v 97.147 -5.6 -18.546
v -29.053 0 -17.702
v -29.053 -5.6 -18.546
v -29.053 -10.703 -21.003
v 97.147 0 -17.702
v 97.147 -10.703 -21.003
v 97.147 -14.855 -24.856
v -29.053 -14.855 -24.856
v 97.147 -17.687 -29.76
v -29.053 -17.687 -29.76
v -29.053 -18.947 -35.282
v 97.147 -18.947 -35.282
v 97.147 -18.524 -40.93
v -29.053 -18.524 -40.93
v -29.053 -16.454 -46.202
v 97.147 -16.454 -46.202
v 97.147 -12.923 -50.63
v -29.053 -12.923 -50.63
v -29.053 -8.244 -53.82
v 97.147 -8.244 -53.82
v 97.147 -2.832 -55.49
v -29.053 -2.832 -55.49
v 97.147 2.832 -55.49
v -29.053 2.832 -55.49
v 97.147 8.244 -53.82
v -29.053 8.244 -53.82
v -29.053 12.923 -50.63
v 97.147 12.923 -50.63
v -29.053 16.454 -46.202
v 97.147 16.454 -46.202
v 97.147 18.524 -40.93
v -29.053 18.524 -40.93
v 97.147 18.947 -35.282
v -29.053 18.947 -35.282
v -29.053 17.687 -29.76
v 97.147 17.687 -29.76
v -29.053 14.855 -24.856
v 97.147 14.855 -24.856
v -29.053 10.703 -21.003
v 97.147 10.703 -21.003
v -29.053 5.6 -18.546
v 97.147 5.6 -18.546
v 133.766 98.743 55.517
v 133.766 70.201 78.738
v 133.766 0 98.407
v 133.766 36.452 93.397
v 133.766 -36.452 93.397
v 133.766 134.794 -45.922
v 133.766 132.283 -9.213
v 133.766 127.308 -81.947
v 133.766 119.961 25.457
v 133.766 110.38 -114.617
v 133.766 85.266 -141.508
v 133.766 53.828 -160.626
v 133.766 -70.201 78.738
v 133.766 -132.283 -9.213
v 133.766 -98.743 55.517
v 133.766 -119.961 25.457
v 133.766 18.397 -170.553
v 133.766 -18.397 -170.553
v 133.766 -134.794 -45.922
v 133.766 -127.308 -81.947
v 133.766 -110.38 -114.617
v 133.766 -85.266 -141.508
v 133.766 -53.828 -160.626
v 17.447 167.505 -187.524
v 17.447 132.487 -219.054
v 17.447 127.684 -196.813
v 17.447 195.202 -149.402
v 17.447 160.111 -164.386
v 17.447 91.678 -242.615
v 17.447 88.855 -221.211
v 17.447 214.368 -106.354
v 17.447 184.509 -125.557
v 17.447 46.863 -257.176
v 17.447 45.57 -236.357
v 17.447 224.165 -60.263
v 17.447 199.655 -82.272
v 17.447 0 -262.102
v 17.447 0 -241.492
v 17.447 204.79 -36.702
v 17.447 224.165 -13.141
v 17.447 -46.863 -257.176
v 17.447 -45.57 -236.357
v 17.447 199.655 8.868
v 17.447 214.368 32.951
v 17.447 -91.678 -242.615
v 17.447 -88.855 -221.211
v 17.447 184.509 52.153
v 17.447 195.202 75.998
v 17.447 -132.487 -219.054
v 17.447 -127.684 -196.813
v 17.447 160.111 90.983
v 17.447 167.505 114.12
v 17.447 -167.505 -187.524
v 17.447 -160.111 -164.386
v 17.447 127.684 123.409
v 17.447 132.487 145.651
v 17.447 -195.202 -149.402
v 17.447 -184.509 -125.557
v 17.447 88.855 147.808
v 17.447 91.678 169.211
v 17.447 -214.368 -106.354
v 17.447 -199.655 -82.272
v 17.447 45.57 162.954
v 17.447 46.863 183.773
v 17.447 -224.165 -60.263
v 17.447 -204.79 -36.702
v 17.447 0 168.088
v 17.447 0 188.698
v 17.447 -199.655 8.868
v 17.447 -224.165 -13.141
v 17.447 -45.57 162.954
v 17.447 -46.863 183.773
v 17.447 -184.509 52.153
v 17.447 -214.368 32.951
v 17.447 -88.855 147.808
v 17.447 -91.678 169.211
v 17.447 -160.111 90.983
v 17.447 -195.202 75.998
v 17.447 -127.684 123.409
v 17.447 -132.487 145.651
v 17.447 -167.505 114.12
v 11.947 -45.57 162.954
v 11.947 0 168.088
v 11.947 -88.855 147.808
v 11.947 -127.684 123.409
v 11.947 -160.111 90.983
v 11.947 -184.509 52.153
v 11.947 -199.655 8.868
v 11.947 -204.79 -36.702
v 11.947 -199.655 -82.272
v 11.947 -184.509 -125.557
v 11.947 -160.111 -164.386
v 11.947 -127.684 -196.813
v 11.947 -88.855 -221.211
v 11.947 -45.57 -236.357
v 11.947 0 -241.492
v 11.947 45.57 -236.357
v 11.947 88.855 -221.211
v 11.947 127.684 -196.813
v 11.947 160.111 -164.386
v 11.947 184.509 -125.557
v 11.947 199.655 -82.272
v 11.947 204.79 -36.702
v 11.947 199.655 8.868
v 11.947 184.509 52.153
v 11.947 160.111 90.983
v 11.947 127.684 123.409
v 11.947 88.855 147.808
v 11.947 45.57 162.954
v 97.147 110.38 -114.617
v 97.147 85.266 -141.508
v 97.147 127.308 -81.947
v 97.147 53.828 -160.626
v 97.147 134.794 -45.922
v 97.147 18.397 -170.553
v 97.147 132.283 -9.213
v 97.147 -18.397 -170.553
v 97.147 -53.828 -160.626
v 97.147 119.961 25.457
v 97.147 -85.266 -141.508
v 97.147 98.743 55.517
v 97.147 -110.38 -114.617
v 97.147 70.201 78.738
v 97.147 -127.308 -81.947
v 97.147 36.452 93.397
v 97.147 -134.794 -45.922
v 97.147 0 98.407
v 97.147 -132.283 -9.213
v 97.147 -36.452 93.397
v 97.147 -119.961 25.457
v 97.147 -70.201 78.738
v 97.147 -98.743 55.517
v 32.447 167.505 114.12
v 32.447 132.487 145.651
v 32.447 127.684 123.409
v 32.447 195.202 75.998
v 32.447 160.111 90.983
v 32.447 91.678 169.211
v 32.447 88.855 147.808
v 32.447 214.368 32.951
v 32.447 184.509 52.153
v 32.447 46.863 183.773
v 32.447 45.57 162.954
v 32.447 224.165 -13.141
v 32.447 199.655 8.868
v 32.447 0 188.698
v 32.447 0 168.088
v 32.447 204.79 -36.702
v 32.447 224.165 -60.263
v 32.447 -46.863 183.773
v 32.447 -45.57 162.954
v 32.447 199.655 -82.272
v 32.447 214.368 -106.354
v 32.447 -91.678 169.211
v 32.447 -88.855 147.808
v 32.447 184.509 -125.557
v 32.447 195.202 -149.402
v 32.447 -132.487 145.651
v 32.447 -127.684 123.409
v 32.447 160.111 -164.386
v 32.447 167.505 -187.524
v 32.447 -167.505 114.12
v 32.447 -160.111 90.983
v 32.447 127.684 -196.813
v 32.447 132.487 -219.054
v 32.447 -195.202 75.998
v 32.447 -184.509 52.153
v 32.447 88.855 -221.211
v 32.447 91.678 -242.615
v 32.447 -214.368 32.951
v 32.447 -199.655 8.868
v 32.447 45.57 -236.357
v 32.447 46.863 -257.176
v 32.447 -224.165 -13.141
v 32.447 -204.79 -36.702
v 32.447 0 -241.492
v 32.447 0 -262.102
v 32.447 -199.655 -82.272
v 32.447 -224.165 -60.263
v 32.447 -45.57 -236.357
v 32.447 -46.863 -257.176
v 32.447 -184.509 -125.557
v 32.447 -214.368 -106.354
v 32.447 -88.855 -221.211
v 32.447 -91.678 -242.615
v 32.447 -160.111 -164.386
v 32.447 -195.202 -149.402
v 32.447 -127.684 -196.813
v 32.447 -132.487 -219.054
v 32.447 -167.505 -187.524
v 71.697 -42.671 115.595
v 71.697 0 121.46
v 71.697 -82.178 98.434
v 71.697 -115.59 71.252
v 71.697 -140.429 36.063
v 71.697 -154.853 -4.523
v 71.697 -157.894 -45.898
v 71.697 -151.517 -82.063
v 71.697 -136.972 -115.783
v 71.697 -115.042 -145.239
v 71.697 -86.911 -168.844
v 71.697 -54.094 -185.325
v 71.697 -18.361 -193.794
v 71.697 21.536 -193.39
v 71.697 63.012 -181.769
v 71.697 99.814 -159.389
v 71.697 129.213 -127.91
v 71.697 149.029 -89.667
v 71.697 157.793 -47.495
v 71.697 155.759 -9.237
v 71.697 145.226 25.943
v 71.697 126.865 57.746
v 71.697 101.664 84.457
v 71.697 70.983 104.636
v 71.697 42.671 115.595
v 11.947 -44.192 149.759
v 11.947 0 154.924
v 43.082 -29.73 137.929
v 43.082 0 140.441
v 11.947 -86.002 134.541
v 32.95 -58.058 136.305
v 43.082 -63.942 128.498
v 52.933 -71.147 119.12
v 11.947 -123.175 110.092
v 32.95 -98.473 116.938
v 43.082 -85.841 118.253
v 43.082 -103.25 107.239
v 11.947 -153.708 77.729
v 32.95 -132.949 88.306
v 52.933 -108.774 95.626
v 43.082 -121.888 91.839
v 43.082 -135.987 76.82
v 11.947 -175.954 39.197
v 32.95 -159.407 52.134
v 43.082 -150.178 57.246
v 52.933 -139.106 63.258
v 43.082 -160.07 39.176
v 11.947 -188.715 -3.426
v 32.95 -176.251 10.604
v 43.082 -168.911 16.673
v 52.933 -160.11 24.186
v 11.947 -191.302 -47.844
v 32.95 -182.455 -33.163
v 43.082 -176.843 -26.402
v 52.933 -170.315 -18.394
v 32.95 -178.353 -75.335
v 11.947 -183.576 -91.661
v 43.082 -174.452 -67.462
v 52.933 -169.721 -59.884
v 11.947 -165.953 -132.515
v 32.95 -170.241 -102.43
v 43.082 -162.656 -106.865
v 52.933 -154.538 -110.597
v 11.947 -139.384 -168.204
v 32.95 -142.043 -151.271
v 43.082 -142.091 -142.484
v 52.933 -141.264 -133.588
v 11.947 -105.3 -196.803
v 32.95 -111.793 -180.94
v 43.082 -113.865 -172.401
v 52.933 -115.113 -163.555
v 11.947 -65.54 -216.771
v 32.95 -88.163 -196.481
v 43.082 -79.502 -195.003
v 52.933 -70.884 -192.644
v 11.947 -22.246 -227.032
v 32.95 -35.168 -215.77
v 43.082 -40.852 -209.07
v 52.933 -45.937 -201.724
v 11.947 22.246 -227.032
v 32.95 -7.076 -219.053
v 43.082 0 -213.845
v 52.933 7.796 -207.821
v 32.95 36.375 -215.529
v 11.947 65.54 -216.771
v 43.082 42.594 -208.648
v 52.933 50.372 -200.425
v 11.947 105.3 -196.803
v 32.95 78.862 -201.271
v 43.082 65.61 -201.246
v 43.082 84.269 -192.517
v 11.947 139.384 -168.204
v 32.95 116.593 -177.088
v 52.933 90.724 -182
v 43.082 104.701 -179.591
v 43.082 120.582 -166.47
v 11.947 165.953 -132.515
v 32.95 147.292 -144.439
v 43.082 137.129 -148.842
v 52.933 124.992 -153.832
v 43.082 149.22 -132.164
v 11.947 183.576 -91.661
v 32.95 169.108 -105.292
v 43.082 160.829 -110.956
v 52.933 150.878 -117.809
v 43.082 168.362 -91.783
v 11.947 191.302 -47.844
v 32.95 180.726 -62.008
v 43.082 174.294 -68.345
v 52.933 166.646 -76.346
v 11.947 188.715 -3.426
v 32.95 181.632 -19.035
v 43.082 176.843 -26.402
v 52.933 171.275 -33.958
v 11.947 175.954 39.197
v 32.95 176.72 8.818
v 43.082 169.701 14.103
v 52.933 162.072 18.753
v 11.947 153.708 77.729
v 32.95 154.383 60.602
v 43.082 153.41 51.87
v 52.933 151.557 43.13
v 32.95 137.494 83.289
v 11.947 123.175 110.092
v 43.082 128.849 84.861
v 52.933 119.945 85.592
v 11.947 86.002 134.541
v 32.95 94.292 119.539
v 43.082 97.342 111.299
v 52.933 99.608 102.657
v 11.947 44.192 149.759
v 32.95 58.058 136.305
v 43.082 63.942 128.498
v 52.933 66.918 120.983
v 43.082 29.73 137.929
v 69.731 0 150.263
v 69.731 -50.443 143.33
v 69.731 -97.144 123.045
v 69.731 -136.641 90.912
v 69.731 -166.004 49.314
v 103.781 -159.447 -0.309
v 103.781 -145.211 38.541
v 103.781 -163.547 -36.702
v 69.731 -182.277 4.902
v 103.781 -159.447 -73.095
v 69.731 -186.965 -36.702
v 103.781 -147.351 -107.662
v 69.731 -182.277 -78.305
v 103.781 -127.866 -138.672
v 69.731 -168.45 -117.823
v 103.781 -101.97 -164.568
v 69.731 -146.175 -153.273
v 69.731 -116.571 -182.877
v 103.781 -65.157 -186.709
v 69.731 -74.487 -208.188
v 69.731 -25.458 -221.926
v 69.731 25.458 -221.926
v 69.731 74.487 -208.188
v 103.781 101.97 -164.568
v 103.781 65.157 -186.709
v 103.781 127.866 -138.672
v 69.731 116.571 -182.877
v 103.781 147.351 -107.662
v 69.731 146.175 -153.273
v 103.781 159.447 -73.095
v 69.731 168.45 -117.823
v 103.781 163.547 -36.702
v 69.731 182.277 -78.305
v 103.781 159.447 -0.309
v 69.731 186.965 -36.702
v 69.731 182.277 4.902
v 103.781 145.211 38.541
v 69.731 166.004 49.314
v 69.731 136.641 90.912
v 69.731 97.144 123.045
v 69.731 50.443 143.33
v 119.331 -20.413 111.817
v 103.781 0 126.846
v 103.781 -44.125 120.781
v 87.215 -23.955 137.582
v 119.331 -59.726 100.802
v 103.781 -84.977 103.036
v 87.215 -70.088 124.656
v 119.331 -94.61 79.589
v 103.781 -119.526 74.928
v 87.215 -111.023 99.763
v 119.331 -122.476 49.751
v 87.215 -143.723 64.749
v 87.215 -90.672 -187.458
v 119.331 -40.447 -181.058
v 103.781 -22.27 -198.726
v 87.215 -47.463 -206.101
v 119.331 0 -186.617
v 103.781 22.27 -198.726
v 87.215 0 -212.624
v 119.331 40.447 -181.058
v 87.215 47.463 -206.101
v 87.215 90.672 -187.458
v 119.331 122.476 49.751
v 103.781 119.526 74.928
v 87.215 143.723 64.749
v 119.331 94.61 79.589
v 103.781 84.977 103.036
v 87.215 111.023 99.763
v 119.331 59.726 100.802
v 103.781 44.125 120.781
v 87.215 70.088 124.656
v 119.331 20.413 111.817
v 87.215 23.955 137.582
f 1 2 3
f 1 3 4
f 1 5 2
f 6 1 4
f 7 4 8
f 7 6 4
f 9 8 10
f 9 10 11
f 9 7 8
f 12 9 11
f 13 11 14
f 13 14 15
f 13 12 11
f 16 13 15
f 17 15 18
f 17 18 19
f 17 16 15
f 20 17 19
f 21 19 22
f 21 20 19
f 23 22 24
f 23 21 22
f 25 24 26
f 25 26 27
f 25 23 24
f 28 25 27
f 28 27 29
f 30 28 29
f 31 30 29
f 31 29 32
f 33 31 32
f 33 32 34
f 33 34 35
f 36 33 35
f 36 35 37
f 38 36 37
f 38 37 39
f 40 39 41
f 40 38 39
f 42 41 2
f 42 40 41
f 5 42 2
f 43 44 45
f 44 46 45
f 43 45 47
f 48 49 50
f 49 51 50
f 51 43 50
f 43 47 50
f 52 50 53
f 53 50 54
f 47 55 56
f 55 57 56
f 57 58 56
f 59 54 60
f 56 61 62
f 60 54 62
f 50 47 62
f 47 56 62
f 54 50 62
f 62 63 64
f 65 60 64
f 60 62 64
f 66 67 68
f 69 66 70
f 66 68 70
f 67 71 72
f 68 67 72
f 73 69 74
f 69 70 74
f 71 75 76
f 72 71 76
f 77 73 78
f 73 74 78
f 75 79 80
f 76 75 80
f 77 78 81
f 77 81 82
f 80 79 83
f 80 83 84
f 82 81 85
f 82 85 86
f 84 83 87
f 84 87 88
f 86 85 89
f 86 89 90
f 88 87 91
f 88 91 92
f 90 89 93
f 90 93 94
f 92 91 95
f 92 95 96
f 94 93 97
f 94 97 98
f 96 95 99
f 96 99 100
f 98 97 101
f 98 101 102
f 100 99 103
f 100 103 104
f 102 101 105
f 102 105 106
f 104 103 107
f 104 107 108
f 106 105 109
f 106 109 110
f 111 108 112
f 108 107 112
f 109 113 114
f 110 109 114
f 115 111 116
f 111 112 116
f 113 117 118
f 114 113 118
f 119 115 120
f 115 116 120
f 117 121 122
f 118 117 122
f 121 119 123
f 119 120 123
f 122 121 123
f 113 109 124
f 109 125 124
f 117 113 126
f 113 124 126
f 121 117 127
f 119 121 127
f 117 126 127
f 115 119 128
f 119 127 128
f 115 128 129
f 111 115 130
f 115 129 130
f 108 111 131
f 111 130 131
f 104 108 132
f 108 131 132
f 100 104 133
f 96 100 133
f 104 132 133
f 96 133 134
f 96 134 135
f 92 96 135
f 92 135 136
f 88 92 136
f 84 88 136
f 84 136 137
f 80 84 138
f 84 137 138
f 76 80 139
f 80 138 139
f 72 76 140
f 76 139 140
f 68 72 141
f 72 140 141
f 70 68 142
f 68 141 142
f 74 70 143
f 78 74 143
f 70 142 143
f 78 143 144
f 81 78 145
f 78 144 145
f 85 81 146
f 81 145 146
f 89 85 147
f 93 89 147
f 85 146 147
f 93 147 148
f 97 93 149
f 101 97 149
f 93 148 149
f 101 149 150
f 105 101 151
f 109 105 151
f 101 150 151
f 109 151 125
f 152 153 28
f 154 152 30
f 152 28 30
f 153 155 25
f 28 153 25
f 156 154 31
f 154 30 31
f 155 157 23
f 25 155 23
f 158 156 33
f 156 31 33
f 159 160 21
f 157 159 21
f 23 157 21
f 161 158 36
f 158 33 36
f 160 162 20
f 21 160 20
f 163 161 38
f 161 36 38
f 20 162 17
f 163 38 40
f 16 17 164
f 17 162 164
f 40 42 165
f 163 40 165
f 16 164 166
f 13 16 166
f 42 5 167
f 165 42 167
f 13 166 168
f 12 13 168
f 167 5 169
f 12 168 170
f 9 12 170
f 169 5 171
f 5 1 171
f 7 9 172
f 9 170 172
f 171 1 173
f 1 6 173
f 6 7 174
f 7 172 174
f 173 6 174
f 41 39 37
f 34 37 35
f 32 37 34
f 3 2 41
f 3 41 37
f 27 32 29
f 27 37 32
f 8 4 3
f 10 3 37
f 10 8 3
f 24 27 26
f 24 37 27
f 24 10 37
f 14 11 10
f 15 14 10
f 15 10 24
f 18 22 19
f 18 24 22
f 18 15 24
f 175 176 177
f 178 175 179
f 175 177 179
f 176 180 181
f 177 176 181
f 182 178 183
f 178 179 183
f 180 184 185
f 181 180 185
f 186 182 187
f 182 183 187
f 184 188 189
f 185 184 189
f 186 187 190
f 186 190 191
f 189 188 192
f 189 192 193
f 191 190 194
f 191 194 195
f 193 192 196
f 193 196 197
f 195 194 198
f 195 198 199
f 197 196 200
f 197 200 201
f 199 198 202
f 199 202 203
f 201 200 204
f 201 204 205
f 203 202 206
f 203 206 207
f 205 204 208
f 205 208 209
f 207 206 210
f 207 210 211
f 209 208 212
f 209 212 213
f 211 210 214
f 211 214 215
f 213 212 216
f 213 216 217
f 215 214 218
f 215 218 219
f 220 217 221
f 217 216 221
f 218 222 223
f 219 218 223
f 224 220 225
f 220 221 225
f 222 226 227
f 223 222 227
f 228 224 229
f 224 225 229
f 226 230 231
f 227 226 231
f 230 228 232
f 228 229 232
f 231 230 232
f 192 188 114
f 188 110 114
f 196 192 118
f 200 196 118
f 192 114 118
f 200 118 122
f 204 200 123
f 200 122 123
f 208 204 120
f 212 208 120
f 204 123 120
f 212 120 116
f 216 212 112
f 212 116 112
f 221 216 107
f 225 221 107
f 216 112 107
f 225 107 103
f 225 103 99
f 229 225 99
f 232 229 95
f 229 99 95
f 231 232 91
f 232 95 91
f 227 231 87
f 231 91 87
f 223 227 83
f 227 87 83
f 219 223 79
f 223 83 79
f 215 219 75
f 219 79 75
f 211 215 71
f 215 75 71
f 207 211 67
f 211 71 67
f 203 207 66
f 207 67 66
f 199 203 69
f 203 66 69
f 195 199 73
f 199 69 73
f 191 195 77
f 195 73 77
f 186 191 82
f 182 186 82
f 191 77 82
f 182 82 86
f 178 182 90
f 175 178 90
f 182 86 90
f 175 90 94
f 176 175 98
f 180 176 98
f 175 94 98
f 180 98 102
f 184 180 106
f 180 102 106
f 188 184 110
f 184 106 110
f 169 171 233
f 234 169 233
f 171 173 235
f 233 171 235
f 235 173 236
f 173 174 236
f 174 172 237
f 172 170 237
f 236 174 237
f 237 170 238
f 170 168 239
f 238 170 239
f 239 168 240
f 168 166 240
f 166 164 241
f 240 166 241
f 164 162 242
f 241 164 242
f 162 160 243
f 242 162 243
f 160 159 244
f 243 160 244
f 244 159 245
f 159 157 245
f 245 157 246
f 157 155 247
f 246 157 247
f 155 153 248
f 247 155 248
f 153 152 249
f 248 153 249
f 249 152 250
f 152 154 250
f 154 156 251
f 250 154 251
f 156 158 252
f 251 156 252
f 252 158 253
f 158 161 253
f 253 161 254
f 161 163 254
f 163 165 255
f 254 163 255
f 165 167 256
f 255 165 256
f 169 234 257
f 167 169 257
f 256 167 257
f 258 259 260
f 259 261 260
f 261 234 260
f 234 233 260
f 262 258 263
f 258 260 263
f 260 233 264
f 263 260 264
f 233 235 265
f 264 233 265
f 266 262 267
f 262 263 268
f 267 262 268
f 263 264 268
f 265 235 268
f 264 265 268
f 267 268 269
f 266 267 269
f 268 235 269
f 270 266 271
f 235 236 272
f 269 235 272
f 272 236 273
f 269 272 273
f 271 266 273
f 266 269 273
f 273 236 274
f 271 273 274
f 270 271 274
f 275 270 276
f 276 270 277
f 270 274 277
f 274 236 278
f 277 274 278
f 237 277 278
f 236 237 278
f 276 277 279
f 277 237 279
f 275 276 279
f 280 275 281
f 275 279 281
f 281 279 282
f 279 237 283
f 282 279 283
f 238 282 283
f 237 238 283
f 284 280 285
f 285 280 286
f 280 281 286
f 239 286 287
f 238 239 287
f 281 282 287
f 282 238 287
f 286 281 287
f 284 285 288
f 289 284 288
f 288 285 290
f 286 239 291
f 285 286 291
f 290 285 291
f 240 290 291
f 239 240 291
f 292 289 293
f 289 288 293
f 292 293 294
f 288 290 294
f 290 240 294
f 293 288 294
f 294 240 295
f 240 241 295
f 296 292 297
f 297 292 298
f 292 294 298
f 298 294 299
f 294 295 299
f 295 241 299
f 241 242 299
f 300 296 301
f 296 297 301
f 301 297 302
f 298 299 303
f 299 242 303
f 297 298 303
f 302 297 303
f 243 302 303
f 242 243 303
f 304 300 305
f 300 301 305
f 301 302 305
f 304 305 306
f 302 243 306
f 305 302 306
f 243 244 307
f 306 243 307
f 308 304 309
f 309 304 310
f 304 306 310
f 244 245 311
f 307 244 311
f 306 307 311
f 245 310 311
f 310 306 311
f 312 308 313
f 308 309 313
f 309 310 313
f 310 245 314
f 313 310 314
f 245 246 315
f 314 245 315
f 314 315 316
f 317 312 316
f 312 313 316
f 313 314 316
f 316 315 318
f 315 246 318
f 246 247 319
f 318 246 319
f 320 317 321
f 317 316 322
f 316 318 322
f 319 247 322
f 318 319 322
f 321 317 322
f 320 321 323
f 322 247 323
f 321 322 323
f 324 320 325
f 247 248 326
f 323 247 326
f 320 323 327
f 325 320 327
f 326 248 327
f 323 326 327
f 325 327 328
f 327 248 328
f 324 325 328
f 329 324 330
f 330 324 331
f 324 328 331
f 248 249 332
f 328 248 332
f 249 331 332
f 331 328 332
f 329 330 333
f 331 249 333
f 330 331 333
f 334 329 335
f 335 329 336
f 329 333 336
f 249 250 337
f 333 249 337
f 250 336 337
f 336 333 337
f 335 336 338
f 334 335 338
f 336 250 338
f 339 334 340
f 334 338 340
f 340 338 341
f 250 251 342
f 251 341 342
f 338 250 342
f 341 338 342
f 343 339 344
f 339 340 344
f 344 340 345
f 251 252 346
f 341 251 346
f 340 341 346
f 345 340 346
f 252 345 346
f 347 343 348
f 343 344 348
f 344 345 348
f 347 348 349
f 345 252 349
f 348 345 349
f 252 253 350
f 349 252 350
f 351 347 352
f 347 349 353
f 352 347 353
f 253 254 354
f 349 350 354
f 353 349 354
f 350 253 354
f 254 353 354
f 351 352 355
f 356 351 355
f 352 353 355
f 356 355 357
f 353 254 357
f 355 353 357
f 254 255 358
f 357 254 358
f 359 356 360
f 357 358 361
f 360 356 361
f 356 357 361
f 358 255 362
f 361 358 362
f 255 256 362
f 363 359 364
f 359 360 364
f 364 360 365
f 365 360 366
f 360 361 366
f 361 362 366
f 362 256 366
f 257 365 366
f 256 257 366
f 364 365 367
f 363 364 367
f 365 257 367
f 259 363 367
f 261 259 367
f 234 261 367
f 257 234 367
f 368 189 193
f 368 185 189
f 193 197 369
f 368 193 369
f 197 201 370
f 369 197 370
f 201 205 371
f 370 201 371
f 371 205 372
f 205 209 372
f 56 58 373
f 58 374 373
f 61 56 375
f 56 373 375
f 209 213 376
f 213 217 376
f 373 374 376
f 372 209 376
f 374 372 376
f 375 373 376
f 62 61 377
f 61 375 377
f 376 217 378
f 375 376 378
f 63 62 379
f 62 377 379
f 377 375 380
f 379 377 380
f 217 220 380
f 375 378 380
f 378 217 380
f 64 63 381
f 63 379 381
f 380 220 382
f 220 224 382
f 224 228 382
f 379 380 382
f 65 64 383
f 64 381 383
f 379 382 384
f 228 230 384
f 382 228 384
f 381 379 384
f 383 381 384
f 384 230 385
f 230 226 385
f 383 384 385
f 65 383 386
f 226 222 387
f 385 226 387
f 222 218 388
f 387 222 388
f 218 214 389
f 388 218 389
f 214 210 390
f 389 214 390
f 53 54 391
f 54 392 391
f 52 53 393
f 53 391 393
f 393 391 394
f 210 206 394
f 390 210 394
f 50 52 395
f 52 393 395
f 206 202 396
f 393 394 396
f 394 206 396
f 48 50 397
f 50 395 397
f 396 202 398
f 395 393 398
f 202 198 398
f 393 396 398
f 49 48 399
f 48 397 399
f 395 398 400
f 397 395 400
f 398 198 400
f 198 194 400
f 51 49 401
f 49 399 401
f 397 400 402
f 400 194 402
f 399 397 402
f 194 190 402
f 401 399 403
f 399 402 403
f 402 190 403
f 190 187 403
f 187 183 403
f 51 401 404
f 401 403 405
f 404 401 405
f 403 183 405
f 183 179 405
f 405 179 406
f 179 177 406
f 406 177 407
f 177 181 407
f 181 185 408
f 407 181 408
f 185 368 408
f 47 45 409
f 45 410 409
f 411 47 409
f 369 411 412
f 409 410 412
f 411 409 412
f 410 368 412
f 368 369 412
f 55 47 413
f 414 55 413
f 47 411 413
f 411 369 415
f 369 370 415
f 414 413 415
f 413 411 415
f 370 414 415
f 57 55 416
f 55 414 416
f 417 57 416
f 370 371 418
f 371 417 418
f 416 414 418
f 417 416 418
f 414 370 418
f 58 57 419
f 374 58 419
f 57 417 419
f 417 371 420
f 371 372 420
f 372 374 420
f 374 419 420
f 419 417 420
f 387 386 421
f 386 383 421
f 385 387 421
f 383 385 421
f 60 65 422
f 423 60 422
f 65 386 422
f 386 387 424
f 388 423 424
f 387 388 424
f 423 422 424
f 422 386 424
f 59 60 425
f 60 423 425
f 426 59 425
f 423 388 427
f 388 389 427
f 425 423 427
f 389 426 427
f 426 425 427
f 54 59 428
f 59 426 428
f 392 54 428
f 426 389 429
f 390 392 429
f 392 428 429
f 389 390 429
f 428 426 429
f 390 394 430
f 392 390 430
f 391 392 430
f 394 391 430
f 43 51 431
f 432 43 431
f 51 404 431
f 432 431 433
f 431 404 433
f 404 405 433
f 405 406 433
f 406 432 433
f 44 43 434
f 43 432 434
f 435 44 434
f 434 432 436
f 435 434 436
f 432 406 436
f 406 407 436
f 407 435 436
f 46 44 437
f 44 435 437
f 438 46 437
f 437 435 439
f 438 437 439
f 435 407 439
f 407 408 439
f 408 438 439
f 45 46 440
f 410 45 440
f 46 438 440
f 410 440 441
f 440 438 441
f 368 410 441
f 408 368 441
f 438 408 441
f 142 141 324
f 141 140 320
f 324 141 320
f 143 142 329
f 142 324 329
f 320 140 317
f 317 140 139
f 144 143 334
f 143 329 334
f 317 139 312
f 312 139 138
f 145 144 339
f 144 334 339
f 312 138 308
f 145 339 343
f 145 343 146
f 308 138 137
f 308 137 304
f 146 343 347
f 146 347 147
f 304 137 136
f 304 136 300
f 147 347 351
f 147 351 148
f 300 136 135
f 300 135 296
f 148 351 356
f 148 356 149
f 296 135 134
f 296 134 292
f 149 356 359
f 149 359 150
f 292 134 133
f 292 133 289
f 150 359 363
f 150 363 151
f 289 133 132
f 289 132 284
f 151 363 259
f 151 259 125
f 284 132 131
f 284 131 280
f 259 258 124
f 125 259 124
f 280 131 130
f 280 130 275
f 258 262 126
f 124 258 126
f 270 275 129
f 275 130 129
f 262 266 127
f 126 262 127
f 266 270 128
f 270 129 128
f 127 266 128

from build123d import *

# Parameters (mm, degrees)
F0_W = 126.2
F0_H = 19


with BuildPart() as f1:
    # F0 (on Front) → F1 (revolve)
    with BuildSketch(Plane.XZ):
        with BuildLine():
            Line((97.1468534022, 98.407350273), (97.1468534022, -17.7018346759))
            Line((97.1468534022, -17.7018346759), (97.1468534022, -36.7018346759))
            Line((97.1468534022, -36.7018346759), (133.7664675539, -36.7018346759))
            Line((133.7664675539, -36.7018346759), (133.7664675539, 98.407350273))
            ThreePointArc((133.7664675539, 98.407350273), (87.2145027715, 139.2207791512), (32.4468534022, 168.0881653241))
            Line((32.4468534022, 168.0881653241), (32.4468534022, 188.6981653241))
            Line((32.4468534022, 188.6981653241), (17.4468534022, 188.6981653241))
            Line((17.4468534022, 188.6981653241), (17.4468534022, 168.0881653241))
            Line((17.4468534022, 168.0881653241), (11.9468534022, 168.0881653241))
            Line((11.9468534022, 168.0881653241), (11.9468534022, 154.9242128815))
            ThreePointArc((11.9468534022, 154.9242128815), (57.7458473392, 131.4883118958), (97.1468534022, 98.407350273))
        make_face()
        with Locations((34.0468534022, -27.2018346759)):
            Rectangle(F0_W, F0_H)
    revolve(axis=Axis((-10.7613705966, 0, -36.7018346759), (1, 0, 0)))


solid = f1.part
